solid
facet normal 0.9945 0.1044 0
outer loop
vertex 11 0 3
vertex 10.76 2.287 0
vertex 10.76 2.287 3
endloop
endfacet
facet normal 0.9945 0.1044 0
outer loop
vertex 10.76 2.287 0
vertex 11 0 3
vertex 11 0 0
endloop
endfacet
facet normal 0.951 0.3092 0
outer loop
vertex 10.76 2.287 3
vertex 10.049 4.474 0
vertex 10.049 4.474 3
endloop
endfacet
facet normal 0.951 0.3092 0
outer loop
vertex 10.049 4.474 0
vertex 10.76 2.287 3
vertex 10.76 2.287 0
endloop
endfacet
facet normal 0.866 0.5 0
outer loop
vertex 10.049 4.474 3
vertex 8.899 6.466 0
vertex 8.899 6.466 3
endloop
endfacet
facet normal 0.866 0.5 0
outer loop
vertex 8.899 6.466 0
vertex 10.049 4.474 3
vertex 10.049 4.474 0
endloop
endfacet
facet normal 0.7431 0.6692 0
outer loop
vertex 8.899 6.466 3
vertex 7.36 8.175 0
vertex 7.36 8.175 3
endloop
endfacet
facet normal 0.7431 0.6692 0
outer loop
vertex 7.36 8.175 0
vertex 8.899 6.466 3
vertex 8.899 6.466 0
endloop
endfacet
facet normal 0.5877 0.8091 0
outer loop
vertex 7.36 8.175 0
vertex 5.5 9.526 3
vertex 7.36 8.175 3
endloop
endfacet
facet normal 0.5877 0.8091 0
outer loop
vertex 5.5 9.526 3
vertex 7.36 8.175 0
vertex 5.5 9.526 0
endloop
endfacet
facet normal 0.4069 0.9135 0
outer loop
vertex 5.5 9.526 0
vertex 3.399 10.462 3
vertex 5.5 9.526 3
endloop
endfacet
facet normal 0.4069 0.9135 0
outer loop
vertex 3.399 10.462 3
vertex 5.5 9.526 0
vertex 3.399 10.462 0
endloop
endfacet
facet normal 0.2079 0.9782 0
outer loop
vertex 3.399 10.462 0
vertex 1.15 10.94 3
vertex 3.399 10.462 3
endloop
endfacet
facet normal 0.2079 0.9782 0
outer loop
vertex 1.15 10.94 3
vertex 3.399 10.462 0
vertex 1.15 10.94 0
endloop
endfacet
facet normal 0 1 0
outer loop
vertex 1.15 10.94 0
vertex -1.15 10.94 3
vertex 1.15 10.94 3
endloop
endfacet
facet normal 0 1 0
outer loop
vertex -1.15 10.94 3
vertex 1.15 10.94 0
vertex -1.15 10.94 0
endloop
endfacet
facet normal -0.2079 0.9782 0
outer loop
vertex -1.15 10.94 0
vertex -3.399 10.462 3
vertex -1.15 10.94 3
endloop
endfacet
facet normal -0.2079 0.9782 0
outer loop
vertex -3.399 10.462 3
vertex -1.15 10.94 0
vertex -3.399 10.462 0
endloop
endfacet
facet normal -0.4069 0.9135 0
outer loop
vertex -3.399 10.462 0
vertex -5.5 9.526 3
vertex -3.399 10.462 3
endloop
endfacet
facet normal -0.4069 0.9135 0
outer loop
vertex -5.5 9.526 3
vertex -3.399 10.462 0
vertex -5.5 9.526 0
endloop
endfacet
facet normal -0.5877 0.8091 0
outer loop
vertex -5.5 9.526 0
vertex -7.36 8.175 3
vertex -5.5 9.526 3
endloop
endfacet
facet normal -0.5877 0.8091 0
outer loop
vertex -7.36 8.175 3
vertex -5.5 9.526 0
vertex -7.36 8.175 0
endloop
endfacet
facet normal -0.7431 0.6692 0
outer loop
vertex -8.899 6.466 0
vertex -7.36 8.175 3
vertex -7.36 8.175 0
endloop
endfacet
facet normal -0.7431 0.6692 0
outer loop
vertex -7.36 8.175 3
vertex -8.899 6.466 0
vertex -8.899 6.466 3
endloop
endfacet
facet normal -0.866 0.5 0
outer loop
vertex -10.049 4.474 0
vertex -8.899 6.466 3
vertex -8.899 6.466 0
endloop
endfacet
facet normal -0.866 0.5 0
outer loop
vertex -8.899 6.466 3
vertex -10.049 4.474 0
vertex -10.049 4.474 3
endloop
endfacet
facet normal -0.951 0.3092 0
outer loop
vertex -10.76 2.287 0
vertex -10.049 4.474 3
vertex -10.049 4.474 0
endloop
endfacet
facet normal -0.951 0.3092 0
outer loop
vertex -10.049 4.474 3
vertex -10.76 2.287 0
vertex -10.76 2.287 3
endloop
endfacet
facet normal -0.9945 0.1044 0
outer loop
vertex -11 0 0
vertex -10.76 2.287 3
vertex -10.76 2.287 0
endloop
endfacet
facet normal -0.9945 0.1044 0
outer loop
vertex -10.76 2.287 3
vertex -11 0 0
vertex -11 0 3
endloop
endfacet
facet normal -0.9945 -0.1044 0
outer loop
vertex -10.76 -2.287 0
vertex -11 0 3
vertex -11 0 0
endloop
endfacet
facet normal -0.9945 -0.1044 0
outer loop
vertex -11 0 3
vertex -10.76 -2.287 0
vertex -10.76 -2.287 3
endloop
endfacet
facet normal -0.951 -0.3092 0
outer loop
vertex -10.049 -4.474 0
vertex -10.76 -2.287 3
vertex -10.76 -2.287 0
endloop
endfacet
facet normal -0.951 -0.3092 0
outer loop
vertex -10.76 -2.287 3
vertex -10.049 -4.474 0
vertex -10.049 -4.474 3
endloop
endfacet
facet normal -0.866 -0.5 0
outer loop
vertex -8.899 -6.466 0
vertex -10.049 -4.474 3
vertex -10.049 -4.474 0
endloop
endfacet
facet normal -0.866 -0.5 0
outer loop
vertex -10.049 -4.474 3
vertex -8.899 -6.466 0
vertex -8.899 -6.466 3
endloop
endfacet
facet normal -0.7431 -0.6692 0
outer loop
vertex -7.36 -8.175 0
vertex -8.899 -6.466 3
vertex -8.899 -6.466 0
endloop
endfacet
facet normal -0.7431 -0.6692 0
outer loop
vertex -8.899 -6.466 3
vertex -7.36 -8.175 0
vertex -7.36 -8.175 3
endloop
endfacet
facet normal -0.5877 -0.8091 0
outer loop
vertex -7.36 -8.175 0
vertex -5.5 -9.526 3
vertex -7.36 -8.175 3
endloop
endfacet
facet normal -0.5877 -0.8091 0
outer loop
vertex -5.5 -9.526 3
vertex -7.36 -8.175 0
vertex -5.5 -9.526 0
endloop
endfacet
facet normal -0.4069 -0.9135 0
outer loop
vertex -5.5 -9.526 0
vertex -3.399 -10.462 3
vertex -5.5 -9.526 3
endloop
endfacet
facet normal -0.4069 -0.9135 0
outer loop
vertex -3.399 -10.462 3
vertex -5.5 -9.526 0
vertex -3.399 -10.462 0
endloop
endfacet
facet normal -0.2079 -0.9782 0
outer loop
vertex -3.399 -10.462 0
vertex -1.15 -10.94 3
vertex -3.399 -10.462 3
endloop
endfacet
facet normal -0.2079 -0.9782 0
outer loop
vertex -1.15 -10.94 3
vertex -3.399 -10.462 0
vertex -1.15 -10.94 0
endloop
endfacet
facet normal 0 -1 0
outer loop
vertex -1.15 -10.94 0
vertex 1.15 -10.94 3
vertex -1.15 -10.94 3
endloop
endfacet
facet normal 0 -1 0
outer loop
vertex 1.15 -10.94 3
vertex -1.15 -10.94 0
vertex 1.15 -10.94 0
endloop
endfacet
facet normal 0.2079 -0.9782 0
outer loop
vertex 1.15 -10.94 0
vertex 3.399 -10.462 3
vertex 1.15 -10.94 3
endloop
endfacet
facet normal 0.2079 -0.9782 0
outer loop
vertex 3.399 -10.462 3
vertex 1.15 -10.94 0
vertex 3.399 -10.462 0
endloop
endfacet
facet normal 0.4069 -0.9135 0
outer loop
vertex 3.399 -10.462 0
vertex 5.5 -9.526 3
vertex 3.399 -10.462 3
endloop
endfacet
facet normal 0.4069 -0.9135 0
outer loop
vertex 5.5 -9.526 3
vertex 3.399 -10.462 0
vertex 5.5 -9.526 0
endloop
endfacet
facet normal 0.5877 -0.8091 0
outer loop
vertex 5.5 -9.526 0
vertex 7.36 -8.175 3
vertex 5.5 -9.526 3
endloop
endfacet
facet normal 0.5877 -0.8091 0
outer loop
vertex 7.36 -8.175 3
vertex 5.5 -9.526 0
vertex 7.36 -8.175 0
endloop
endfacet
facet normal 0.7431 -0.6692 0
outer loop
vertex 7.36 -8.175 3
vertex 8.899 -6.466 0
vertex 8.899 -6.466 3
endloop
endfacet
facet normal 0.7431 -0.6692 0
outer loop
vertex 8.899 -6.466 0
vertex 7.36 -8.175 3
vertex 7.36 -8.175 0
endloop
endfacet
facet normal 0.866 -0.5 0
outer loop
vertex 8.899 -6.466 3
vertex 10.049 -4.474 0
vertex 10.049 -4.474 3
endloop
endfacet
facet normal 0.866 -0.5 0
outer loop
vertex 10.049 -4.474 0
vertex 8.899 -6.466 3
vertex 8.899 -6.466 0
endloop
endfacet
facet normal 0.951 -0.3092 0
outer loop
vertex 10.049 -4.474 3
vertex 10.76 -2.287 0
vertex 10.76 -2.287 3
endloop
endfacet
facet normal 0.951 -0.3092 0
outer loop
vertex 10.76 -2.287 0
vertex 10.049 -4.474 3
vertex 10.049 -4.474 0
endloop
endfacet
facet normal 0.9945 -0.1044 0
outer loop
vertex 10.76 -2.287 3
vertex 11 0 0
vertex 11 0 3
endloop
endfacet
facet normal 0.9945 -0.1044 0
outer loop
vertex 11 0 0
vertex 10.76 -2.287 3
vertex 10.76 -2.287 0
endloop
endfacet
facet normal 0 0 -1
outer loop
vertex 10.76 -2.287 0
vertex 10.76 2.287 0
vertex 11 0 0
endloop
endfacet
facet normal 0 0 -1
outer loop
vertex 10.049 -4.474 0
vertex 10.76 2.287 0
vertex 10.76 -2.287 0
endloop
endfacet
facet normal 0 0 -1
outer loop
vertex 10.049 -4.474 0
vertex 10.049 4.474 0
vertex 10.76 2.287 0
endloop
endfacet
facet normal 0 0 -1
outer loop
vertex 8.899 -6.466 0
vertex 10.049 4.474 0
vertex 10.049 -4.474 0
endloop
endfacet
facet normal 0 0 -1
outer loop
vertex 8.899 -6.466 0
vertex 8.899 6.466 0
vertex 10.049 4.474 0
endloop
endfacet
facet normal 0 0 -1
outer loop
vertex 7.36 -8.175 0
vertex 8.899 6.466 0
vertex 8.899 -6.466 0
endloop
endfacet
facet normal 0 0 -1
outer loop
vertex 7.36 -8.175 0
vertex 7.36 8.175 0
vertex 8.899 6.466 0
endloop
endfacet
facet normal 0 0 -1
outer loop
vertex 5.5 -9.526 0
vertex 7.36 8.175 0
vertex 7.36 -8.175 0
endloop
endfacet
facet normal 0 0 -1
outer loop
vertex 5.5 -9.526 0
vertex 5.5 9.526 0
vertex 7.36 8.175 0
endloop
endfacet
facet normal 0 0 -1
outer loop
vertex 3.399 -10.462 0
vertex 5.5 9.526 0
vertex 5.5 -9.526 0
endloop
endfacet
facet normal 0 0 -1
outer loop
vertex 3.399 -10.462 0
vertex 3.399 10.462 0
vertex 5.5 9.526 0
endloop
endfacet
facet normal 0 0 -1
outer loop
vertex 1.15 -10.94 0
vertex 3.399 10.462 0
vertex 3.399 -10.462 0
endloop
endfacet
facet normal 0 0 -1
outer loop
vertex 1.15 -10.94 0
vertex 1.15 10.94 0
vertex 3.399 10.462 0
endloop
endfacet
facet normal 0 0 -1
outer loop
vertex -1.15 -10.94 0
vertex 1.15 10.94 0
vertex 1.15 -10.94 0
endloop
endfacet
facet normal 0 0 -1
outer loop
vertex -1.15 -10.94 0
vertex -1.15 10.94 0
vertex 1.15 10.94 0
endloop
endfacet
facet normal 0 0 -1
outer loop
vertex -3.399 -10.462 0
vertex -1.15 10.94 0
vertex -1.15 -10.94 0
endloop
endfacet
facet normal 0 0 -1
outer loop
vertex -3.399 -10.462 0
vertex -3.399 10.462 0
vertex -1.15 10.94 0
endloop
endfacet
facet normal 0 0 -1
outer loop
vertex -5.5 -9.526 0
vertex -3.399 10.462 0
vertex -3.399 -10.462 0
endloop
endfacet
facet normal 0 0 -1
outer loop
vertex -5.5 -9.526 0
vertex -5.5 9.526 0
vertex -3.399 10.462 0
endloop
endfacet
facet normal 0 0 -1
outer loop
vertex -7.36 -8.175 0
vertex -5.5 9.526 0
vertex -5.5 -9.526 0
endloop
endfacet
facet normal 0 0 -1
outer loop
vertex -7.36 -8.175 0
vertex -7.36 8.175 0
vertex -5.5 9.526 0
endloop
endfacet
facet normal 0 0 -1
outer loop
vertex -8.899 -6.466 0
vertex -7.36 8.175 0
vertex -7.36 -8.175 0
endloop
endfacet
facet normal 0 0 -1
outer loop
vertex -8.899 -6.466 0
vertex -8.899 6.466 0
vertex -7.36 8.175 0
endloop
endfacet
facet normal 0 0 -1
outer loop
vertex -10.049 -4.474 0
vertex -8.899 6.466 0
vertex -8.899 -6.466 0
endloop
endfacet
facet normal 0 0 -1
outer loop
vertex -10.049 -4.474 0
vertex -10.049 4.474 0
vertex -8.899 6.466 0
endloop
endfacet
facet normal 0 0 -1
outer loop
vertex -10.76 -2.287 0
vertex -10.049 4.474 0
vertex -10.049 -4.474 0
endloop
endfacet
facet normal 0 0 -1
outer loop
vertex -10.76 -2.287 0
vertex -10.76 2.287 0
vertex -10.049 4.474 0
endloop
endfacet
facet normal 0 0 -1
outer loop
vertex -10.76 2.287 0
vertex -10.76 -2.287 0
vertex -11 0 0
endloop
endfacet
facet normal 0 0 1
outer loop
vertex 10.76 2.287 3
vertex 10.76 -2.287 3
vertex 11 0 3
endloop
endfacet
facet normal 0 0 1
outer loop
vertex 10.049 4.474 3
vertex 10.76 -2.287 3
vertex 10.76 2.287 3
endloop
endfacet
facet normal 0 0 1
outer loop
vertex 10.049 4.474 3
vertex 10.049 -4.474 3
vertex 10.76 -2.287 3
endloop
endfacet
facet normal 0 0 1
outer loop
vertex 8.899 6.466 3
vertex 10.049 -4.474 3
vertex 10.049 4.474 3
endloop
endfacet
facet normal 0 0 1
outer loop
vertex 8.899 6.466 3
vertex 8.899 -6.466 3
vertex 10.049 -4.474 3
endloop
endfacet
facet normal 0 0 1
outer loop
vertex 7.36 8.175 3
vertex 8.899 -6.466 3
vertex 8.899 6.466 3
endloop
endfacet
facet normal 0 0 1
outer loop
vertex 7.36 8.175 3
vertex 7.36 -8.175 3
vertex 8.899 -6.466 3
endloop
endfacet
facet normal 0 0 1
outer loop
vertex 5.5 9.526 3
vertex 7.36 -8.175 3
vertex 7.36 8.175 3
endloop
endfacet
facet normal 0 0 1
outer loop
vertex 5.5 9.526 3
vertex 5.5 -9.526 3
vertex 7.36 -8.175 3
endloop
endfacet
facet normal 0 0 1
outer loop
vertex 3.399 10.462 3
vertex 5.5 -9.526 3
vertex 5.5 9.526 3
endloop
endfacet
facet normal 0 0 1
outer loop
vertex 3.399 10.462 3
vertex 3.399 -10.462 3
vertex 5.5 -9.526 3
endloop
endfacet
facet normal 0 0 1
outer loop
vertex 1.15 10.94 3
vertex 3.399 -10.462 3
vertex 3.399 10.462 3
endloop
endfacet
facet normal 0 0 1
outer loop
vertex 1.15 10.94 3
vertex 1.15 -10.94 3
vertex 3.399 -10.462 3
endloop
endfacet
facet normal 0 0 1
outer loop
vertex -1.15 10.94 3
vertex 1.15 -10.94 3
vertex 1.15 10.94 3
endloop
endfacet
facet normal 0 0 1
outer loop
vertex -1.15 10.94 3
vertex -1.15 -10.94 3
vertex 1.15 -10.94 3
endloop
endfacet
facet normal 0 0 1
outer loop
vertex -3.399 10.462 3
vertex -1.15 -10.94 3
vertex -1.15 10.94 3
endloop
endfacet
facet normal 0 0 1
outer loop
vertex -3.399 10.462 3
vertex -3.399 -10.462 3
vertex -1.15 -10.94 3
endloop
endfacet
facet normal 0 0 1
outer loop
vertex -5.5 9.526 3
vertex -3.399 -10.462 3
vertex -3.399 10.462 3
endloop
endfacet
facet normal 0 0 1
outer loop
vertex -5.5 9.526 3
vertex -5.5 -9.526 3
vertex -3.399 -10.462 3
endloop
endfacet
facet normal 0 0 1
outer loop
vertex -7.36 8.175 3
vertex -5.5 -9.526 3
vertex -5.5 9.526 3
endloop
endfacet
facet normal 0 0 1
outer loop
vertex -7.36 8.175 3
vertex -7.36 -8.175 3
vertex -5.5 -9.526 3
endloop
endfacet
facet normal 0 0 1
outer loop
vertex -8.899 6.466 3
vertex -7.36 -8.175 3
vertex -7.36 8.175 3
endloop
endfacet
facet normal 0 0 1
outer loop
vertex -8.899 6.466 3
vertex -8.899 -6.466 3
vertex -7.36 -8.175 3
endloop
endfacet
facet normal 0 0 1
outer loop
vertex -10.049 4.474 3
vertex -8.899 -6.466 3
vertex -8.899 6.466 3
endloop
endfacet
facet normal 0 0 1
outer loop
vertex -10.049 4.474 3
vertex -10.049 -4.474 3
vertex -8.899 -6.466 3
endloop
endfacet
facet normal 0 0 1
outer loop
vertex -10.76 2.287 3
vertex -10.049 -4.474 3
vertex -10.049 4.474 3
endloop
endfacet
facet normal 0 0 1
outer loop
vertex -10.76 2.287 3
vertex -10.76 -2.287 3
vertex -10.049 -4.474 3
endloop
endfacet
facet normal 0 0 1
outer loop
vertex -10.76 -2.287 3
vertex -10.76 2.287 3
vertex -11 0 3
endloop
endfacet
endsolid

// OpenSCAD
// Generated by SolidPython 1.0.1 on 2020-07-29 00:39:25


cylinder(h = 3, r1 = 11, r2 = 11);
/***********************************************
*********      SolidPython code:      **********
************************************************
 
# import packages: SolidPython
from solid import *
from solid.utils import *
from itertools import chain, combinations


class Resize:

    def __init__(self, scad_file):
        self.scad_file = scad_file
        #self.scad_file = import_scad(scad_file)
        # cone/cylinder param:
        self.r1 = 0
        self.r2 = 0
        self.h = 0
        # rectangular prism param:
        self.w = 0
        self.l = 0
        # ellipse param:
        self.r = 0

    # import OpenScad code (file name corresponds to shape)


    # classify shape + parameters
    def assign(self, param1, param2, param3):
        if self.scad_file == 'cone.scad':
            self.r1 = param1
            self.r2 = param2
            self.h = param3
        elif self.scad_file == 'cylinder.scad':
            self.r1 = param1
            self.r2 = param2
            self.h = param3
        elif self.scad_file == 'rectangularPrism.scad':
            self.h = param1
            self.l = param2
            self.w = param3
        else:
            self.r = param1
            self.h = param2

    # resize parameters
    def iterate(self):
        x = range(3, 20, 2)
        i = 1
        if self.scad_file == 'cone.scad':
            tempList = list(combinations(x, 2))
            for temp in tempList:
                param1 = temp[0]
                param2 = temp[1]
                filepath = 'produced_scad_files/' + 'cone' + str(param1) + '_' + str(param2) + '_' + '.scad'
                scad_render_to_file(cylinder(h=param1, r1=param2, r2=0), filepath)

        elif self.scad_file == 'cylinder.scad':
            tempList = list(combinations(x, 3))
            for temp in tempList:
                param1 = temp[0]
                param2 = temp[1]
                filepath = 'produced_scad_files/' + 'cylinder' + str(param1) + '_' + str(param2) + '_' + '.scad'
                scad_render_to_file(cylinder(h=param1, r1=param2, r2=param2), filepath)

        elif self.scad_file == 'rectangularPrism.scad':
            tempList = list(combinations(x, 3))
            for temp in tempList:
                param1 = temp[0]
                param2 = temp[1]
                param3 = temp[2]
                filepath = 'produced_scad_files/' + 'rectangularPrism' + str(param1) + '_' + str(param2) + '_' + str(
                    param3) + '.scad'
                scad_render_to_file(cube(size=(param1, param2, param3)), filepath)

        elif self.scad_file == 'ellipse.scad':
            tempList = list(combinations(x, 4))
            for temp in tempList:
                param1 = temp[0]
                param2 = temp[1]
                param3 = temp[2]
                param4 = temp[3]
                filepath = 'produced_scad_files/' + 'ellipse' + str(param1) + '_' + str(param2) + '_' + str(param3) + '_' + str(param4) + '.scad'
                scad_render_to_file(scale([param1, param2, param3])(sphere(r=param4)), filepath)

    def render_to_scadfile(self):
        scad_render_to_file(scad, 'example.scad') 
 
************************************************/
